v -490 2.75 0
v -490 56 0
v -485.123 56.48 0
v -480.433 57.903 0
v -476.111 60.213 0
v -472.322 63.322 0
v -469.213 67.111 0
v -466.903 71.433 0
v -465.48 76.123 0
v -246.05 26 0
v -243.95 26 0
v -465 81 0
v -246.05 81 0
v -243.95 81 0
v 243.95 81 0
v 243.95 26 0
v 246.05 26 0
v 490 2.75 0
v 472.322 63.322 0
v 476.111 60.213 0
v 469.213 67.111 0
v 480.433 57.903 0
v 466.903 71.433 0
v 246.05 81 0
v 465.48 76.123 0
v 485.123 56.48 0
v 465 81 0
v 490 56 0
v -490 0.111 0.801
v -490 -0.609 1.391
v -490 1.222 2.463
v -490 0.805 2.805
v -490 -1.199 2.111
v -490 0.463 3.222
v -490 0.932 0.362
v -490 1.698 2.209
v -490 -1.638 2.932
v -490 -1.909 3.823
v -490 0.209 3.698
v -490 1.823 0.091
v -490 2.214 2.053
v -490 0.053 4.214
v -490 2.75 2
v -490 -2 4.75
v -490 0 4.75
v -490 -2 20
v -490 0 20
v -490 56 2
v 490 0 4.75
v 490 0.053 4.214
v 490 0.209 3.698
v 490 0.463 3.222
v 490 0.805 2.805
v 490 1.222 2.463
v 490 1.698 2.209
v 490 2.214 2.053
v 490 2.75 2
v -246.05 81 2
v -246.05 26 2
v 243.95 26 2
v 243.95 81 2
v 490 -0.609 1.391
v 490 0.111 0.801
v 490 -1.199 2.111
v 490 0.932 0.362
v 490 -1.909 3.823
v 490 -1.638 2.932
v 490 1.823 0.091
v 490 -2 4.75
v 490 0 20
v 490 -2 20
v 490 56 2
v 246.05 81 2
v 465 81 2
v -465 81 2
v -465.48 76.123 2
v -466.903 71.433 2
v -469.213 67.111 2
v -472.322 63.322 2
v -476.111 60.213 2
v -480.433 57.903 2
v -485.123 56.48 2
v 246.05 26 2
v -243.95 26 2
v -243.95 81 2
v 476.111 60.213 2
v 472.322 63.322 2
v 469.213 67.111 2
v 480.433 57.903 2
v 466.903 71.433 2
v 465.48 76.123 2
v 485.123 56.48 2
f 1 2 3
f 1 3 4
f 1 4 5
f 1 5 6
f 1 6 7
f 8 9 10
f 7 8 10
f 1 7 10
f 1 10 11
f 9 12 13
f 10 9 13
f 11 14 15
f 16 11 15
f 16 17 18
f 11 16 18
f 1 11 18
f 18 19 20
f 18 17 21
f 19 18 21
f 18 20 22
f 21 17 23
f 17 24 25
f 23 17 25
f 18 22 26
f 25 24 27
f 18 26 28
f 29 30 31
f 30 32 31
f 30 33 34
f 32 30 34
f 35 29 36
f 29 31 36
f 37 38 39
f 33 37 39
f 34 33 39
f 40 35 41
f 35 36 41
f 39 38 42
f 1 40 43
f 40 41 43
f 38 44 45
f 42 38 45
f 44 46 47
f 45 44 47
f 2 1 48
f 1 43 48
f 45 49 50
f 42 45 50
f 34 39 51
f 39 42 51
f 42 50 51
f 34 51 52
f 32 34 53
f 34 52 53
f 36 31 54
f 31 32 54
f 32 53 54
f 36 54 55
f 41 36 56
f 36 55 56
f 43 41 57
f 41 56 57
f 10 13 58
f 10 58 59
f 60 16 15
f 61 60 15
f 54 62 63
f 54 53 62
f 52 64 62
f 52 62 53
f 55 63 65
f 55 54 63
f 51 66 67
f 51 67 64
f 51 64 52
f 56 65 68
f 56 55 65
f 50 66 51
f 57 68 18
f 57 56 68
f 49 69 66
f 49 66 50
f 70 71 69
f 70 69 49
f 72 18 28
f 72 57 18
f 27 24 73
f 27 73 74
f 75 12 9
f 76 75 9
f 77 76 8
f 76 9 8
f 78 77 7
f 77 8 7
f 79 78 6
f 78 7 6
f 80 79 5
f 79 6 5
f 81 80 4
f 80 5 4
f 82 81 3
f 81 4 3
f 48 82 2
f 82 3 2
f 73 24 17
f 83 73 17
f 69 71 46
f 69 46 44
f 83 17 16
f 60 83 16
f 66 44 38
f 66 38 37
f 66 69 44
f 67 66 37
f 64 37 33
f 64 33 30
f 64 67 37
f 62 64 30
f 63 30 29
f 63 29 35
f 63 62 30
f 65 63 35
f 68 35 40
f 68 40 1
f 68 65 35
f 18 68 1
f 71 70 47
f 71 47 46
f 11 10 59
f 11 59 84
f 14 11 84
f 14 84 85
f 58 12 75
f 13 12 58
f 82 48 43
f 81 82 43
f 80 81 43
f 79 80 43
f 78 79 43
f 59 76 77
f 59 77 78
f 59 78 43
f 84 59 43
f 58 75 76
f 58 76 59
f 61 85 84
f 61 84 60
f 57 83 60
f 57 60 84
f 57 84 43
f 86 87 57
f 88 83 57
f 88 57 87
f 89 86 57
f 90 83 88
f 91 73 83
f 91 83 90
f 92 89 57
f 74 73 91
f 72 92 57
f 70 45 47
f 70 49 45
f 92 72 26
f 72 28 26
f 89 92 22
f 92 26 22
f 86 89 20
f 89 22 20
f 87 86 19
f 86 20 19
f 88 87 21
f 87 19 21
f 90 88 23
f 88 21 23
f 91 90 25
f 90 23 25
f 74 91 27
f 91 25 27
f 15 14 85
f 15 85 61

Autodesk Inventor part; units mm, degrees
ref_plane "YZ Plane" through (0, 0, 0) normal (1, 0, 0) x (0, 1, 0)
ref_plane "XZ Plane" through (0, 0, 0) normal (0, 1, 0) x (-1, 0, 0)
ref_plane "XY Plane" through (0, 0, 0) normal (0, 0, 1) x (1, 0, 0)
sketch "Sketch1" plane through (0, 0, 0) normal (0, 0, 1) x (1, 0, 0)
  line L0 (-490, 81) -> (490, 81)
  line L1 (490, 81) -> (490, 0)
  line L2 (490, 0) -> (-490, 0)
  line L3 (-490, 0) -> (-490, 81)
  point P0 (0, 0)
  point P1 (0, 0)
  dimension "d0" = 980
  dimension "d1" = 81
extrude "Plate1" add sketch "Sketch1" along normal blind 2
sketch "Sketch2" plane through (490, -2, 0) normal (0, 1, 0) x (-1, 0, 0)
  line L0 (980, 0) -> (0, 0)
  line L1 (0, 0) -> (0, 20)
  line L2 (0, 20) -> (980, 20)
  line L3 (980, 20) -> (980, 0)
edge flange "Flange1" height 20 angle 90 thickness 2 bend radius 2.75 thickness toward (0, 1, 0) relief round relief width 2 relief depth 1 edges at (0, 0, 2) wall of the first edge with corners at (-490, -2, 0) (490, -2, 0) (490, -2, 20) (-490, -2, 20)
bend "Bend1"
corner "Corner1"
sketch "Sketch5" plane through (0, 0, 0) normal (0, 0, -1) x (-1, 0, 0)
  line L0 (490, 81) -> (-490, 81) projected
  line L1 (490, -2) -> (-490, -2) projected
  circle A0 centre (0, 81) radius 25
  line L2 (243.95, 81) -> (246.05, 81)
  line L3 (246.05, 81) -> (246.05, 26)
  line L4 (246.05, 26) -> (243.95, 26)
  line L5 (243.95, 26) -> (243.95, 81)
  line L6 (-243.95, 81) -> (-246.05, 81)
  line L7 (-246.05, 81) -> (-246.05, 26)
  line L8 (-246.05, 26) -> (-243.95, 26)
  line L9 (-243.95, 26) -> (-243.95, 81)
  line L10 (0, 81) -> (0, -2) construction
  line L11 (-490, -2) -> (-490, 81)
  line L12 (490, -2) -> (490, 81)
  circle A1 centre (-490, 81) radius 25
  circle A2 centre (490, 81) radius 25
  point P0 (0, 0)
  point P1 (245, 26)
  point P2 (-245, 26)
  point P3 (246.05, 81)
  point P4 (-25, 81)
  point P5 (25, 81)
  point P6 (-246.05, 81)
  point P7 (465, 81)
  point P8 (490, 56)
  point P9 (-490, 56)
  point P10 (-465, 81)
  dimension "d45" = 50
  dimension "d48" = 2.1
  dimension "d49" = 490
  dimension "d51" = 28
  dimension "d52" = 55
extrude "Extrusion1" cut sketch "Sketch5" against normal through all contours L3 L4 L5 L0 | L0 L12 A2 | L9 L8 L7 L0 | L11 L0 A1 picked at (488.1457, 64.5423) picked at (-481.1886, 66.9767)
sketch "Sketch9" plane through (0, 0, 2) normal (0, 0, 1) x (1, 0, 0)
  line L0 (467.0539, 27.7998) -> (467.0539, 15.7998) construction
  line L1 (467.0539, 15.7998) -> (267.0539, 15.7998) construction
  line L2 (267.0539, 15.7998) -> (267.0539, 27.7998) construction
  line L3 (267.0539, 27.7998) -> (467.0539, 27.7998) construction
  line L4 (-490, 81) -> (490, 81) projected
  point P0 (0, 0)
  point P1 (1.05, 68)
  point P2 (490, 81)
  point P3 (-490, 81)
  dimension "d40" = 200
  dimension "d41" = 12
mark "Mark2"
equation "\"d2\" = Thickness"
equation "\"d3\" = BendReliefWidth"
equation "\"d4\" = BendReliefDepth"
equation "\"d5\" = MinimumRemnant"
equation "\"d6\" = TransitionRadius"
equation "\"d9\" = BendRadius"
equation "\"d10\" = CornerReliefSize"
equation "\"d11\" = GapSize"
equation "\"d12\" = JacobiRadiusSize"
equation "\"BendReliefWidth\" = Thickness"
equation "\"BendReliefDepth\" = 0.5 * Thickness"
equation "\"CornerReliefSize\" = 4 * Thickness"
equation "\"MinimumRemnant\" = 2 * Thickness"
equation "\"TransitionRadius\" = BendRadius"
equation "\"JacobiRadiusSize\" = BendRadius"
equation "\"GapSize\" = Thickness"
equation "\"Thickness\" = 2"
equation "\"BendRadius\" = 2.75"
properties part number "MSC 331 STRINGER BOARD  ####" material "Stainless Steel"
